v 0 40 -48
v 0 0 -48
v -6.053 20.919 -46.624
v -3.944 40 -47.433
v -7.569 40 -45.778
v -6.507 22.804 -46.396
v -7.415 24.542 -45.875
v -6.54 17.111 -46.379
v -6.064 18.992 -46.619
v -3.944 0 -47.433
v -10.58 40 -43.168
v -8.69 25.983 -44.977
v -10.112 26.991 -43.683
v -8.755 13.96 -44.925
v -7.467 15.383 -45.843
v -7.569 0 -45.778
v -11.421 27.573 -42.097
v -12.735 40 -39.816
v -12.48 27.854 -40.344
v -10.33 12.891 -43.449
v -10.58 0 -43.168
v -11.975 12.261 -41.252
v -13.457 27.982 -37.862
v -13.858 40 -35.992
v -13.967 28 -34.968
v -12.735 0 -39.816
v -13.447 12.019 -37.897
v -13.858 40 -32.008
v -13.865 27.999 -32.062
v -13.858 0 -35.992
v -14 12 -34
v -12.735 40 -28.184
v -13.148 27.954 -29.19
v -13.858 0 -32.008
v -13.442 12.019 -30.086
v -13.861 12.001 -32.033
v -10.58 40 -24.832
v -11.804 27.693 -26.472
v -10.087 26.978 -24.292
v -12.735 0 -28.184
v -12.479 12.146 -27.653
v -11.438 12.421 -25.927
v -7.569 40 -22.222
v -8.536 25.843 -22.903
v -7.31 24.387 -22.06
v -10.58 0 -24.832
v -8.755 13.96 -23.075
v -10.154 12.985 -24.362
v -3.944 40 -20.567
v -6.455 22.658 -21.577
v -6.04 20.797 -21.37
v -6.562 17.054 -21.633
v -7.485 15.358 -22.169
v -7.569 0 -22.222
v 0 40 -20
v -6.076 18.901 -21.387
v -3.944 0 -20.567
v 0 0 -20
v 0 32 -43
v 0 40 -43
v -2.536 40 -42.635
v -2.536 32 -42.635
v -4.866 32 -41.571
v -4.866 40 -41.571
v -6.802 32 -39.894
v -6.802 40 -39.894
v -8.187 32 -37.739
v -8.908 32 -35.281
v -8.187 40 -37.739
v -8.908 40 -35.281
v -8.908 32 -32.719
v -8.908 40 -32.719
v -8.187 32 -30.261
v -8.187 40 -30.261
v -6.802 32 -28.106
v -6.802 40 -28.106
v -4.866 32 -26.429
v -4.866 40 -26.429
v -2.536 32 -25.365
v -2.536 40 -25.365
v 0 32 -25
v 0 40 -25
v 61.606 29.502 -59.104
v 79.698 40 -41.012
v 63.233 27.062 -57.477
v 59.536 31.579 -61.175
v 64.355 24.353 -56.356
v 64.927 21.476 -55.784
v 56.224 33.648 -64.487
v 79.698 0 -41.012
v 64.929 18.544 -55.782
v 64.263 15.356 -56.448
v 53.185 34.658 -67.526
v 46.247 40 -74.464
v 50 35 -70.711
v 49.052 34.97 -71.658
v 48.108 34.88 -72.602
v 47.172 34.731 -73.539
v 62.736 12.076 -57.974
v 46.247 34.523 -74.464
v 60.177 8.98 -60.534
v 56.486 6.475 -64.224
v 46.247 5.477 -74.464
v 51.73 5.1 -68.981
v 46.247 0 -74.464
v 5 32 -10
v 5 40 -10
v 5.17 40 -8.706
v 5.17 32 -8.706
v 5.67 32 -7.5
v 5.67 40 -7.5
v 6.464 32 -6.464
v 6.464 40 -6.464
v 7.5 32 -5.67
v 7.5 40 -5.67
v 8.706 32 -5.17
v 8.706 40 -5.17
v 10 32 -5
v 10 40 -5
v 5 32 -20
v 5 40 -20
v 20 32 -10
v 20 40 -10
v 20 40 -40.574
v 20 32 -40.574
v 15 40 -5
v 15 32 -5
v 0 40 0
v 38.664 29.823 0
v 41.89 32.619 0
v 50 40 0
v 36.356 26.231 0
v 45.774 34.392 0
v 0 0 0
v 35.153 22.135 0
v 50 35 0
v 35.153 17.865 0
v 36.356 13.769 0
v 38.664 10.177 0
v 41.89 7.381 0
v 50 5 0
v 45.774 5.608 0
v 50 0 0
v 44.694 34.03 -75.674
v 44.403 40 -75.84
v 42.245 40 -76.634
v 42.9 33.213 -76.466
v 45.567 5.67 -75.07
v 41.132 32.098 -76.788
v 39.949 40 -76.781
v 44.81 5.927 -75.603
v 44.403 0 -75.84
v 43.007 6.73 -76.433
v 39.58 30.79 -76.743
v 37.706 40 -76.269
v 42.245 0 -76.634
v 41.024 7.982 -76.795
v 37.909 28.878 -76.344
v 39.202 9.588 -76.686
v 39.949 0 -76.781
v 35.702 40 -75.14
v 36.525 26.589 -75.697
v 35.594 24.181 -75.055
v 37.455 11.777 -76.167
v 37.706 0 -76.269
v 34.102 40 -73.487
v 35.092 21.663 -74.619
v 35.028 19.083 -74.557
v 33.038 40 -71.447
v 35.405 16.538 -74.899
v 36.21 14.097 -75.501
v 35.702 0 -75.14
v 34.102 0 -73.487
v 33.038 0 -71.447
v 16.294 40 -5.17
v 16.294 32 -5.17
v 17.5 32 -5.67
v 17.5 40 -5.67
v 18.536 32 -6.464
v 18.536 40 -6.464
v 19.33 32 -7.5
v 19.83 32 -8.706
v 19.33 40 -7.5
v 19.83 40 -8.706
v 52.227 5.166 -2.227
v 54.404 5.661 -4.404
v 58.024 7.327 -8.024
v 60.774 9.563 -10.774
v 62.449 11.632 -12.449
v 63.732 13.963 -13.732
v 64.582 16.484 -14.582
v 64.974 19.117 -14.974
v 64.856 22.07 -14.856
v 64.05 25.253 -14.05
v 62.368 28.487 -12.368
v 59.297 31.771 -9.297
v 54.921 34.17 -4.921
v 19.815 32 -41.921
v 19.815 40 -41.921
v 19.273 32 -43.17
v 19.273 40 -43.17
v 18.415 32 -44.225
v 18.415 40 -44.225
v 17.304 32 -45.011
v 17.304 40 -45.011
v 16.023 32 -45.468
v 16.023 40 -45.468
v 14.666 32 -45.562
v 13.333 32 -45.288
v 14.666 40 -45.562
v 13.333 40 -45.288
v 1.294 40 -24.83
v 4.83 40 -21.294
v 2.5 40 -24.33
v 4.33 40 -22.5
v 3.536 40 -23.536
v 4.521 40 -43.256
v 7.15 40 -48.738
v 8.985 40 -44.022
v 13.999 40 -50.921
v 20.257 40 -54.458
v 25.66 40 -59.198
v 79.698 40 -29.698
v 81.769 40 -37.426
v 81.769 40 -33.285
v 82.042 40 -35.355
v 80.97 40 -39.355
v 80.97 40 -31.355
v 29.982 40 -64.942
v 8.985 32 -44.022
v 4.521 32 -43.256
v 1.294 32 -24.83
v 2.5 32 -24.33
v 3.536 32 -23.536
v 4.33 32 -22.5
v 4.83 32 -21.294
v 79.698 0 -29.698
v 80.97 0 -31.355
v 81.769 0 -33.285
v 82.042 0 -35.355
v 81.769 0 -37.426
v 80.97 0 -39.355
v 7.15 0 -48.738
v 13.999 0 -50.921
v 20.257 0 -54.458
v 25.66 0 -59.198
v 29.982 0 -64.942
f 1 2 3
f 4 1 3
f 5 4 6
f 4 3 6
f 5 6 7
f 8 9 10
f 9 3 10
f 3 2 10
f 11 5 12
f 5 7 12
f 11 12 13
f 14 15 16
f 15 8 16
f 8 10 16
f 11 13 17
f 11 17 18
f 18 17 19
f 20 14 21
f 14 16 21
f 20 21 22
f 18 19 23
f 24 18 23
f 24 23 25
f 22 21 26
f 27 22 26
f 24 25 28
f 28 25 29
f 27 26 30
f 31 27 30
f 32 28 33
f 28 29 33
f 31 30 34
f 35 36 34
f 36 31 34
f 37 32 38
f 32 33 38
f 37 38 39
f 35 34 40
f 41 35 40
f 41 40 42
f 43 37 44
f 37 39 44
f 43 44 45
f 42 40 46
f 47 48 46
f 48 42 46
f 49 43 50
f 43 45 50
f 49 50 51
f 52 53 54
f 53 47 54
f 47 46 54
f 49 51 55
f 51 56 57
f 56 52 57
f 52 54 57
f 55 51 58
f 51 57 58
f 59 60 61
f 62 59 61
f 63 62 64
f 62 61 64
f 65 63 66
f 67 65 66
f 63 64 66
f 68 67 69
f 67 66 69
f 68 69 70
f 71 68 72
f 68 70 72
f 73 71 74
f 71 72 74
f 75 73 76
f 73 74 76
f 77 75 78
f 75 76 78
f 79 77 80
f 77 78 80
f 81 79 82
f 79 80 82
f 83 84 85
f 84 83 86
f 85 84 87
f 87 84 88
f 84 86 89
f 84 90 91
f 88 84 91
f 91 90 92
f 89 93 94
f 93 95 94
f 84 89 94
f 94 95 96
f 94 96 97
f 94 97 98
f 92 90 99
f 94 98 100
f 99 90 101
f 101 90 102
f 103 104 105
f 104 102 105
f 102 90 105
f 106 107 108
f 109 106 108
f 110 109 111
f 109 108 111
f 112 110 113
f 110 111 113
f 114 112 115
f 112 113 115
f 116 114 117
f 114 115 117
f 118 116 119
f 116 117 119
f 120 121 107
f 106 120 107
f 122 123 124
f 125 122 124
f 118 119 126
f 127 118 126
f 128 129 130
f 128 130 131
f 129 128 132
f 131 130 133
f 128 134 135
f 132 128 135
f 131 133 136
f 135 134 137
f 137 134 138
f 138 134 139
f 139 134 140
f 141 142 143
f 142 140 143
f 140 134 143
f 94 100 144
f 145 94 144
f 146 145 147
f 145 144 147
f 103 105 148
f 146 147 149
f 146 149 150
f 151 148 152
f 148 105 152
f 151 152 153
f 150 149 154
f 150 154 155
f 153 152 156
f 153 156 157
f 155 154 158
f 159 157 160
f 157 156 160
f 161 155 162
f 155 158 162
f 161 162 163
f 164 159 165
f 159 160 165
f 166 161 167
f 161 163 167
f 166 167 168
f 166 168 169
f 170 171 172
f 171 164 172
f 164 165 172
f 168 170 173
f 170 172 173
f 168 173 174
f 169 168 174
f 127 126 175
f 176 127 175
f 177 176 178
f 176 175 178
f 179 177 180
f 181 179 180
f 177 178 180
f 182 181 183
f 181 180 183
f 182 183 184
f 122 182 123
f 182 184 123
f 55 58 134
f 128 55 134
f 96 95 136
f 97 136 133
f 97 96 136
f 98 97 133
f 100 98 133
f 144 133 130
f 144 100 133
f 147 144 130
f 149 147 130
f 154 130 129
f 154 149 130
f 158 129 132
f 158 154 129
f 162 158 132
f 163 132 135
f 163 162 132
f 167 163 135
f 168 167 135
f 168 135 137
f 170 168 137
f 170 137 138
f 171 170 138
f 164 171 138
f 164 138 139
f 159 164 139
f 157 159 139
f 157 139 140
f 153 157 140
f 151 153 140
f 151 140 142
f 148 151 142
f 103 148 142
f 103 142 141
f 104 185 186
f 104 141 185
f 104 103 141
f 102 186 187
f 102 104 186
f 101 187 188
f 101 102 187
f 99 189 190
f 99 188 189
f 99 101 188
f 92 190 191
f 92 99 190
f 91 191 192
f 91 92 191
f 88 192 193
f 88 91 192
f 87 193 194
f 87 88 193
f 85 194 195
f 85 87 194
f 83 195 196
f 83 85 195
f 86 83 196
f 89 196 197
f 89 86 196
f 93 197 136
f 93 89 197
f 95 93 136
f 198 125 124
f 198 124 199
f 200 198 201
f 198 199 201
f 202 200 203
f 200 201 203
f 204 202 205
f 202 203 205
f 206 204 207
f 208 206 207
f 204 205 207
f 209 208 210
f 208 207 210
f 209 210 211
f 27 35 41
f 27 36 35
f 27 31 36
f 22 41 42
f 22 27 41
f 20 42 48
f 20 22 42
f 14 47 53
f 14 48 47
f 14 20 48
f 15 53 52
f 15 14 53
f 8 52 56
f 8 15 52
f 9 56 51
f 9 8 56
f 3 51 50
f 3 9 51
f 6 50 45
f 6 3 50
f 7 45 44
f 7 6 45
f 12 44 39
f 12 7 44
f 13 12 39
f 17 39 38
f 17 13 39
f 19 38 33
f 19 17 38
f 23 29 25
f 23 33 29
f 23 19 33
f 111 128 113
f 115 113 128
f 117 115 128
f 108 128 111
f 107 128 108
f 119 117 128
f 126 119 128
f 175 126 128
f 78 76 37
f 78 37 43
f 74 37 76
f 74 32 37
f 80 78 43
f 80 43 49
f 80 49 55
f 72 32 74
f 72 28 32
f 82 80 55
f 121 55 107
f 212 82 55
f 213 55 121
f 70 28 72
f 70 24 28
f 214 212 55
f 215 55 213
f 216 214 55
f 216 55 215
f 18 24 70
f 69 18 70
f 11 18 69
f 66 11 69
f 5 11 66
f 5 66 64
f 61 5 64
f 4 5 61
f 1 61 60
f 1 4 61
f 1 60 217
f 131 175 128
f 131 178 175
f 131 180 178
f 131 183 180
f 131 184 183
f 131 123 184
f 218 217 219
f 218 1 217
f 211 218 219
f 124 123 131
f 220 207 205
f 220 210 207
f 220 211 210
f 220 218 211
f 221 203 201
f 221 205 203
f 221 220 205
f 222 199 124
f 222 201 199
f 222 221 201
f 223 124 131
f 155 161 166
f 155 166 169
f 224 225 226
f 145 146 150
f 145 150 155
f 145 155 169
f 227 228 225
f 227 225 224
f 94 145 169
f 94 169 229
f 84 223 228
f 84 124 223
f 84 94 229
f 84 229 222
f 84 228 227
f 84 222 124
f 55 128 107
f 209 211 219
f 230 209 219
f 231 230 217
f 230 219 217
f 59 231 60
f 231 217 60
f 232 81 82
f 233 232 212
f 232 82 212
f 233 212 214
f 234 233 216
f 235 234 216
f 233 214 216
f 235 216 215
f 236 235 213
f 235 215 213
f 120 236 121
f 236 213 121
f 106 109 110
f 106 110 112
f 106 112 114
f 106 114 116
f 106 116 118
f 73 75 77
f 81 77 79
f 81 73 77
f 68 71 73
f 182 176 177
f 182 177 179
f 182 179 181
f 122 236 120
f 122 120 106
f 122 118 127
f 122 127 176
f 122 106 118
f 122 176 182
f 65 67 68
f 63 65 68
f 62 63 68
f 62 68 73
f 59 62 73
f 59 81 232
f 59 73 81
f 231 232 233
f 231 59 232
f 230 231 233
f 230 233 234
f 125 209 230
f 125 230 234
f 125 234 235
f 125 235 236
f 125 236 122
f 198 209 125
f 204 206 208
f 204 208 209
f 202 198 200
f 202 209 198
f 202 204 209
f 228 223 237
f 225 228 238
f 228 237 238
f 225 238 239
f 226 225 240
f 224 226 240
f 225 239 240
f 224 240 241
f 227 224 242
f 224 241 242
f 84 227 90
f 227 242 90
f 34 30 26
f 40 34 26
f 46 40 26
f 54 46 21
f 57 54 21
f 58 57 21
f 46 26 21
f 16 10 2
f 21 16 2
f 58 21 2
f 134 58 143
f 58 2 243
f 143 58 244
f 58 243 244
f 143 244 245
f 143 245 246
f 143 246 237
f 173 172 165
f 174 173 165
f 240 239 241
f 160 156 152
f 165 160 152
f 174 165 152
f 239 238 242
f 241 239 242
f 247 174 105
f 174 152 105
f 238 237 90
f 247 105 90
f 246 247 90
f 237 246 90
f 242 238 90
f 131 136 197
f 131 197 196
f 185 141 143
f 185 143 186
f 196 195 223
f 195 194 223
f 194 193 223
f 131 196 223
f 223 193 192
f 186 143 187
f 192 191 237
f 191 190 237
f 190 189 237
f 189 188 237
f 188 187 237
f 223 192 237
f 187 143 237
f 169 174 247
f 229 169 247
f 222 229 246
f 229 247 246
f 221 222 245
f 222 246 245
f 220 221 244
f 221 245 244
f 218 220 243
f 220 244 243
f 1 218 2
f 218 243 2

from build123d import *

# Parameters (mm, degrees)
BOSS_EXTRUDE1_DEPTH     = 40
CUT_EXTRUDE1_DEPTH      = 8
CUT_EXTRUDE2_DEPTH      = 120.290091807
CUT_EXTRUDE2_DEPTH_BACK = 120.290091807
SKETCH3_R               = 15


with BuildPart() as part:
    # Sketch1 → Boss-Extrude1 (new body)
    with BuildSketch(Plane(origin=(0, 0, 0), x_dir=(1, 0, 0), z_dir=(0, 1, 0))):
        with BuildLine():
            Line((0, 0), (50, 0))
            Line((50, 0), (79.69848481, 29.69848481))
            ThreePointArc((79.69848481, 29.69848481), (82.04163056, 35.355339059), (79.69848481, 41.012193309))
            Line((79.69848481, 41.012193309), (46.246943589, 74.463734529))
            ThreePointArc((46.246943589, 74.463734529), (38.809068701, 76.606108799), (33.038444811, 71.447460693))
            ThreePointArc((33.038444811, 71.447460693), (20.256617737, 54.457585283), (0, 48))
            ThreePointArc((0, 48), (-14, 34), (0, 20))
            Line((0, 20), (0, 0))
        make_face()
    extrude(amount=BOSS_EXTRUDE1_DEPTH)

    # Sketch2 → Cut-Extrude1 (cut)
    with BuildSketch(Plane(origin=(0, 40, 0), x_dir=(1, 0, 0), z_dir=(0, 1, 0))):
        with BuildLine():
            Line((20, 10), (20, 40.573593129))
            ThreePointArc((20, 40.573593129), (17.886751346, 44.656076033), (13.333333333, 45.287638337))
            ThreePointArc((13.333333333, 45.287638337), (6.764079149, 43.576057614), (0, 43))
            ThreePointArc((0, 43), (-9, 34), (0, 25))
            ThreePointArc((0, 25), (3.535533906, 23.535533906), (5, 20))
            Line((5, 20), (5, 10))
            ThreePointArc((5, 10), (6.464466094, 6.464466094), (10, 5))
            Line((10, 5), (15, 5))
            ThreePointArc((15, 5), (18.535533906, 6.464466094), (20, 10))
        make_face()
    extrude(amount=-CUT_EXTRUDE1_DEPTH, mode=Mode.SUBTRACT)

    # Sketch3 → Cut-Extrude2 (cut, two sides: drawn at the far end of the back side and taken through both)
    with BuildSketch(Plane.XY.offset(-CUT_EXTRUDE2_DEPTH_BACK)):
        with Locations(Location((50, 20, 0), (0, 0, 90))):
            Circle(SKETCH3_R)
        with BuildLine():
            Line((-14, 28), (-14, 12))
            ThreePointArc((-14, 12), (-6, 20), (-14, 28))
        make_face()
    extrude(amount=CUT_EXTRUDE2_DEPTH + CUT_EXTRUDE2_DEPTH_BACK, mode=Mode.SUBTRACT)


solid = part.part
